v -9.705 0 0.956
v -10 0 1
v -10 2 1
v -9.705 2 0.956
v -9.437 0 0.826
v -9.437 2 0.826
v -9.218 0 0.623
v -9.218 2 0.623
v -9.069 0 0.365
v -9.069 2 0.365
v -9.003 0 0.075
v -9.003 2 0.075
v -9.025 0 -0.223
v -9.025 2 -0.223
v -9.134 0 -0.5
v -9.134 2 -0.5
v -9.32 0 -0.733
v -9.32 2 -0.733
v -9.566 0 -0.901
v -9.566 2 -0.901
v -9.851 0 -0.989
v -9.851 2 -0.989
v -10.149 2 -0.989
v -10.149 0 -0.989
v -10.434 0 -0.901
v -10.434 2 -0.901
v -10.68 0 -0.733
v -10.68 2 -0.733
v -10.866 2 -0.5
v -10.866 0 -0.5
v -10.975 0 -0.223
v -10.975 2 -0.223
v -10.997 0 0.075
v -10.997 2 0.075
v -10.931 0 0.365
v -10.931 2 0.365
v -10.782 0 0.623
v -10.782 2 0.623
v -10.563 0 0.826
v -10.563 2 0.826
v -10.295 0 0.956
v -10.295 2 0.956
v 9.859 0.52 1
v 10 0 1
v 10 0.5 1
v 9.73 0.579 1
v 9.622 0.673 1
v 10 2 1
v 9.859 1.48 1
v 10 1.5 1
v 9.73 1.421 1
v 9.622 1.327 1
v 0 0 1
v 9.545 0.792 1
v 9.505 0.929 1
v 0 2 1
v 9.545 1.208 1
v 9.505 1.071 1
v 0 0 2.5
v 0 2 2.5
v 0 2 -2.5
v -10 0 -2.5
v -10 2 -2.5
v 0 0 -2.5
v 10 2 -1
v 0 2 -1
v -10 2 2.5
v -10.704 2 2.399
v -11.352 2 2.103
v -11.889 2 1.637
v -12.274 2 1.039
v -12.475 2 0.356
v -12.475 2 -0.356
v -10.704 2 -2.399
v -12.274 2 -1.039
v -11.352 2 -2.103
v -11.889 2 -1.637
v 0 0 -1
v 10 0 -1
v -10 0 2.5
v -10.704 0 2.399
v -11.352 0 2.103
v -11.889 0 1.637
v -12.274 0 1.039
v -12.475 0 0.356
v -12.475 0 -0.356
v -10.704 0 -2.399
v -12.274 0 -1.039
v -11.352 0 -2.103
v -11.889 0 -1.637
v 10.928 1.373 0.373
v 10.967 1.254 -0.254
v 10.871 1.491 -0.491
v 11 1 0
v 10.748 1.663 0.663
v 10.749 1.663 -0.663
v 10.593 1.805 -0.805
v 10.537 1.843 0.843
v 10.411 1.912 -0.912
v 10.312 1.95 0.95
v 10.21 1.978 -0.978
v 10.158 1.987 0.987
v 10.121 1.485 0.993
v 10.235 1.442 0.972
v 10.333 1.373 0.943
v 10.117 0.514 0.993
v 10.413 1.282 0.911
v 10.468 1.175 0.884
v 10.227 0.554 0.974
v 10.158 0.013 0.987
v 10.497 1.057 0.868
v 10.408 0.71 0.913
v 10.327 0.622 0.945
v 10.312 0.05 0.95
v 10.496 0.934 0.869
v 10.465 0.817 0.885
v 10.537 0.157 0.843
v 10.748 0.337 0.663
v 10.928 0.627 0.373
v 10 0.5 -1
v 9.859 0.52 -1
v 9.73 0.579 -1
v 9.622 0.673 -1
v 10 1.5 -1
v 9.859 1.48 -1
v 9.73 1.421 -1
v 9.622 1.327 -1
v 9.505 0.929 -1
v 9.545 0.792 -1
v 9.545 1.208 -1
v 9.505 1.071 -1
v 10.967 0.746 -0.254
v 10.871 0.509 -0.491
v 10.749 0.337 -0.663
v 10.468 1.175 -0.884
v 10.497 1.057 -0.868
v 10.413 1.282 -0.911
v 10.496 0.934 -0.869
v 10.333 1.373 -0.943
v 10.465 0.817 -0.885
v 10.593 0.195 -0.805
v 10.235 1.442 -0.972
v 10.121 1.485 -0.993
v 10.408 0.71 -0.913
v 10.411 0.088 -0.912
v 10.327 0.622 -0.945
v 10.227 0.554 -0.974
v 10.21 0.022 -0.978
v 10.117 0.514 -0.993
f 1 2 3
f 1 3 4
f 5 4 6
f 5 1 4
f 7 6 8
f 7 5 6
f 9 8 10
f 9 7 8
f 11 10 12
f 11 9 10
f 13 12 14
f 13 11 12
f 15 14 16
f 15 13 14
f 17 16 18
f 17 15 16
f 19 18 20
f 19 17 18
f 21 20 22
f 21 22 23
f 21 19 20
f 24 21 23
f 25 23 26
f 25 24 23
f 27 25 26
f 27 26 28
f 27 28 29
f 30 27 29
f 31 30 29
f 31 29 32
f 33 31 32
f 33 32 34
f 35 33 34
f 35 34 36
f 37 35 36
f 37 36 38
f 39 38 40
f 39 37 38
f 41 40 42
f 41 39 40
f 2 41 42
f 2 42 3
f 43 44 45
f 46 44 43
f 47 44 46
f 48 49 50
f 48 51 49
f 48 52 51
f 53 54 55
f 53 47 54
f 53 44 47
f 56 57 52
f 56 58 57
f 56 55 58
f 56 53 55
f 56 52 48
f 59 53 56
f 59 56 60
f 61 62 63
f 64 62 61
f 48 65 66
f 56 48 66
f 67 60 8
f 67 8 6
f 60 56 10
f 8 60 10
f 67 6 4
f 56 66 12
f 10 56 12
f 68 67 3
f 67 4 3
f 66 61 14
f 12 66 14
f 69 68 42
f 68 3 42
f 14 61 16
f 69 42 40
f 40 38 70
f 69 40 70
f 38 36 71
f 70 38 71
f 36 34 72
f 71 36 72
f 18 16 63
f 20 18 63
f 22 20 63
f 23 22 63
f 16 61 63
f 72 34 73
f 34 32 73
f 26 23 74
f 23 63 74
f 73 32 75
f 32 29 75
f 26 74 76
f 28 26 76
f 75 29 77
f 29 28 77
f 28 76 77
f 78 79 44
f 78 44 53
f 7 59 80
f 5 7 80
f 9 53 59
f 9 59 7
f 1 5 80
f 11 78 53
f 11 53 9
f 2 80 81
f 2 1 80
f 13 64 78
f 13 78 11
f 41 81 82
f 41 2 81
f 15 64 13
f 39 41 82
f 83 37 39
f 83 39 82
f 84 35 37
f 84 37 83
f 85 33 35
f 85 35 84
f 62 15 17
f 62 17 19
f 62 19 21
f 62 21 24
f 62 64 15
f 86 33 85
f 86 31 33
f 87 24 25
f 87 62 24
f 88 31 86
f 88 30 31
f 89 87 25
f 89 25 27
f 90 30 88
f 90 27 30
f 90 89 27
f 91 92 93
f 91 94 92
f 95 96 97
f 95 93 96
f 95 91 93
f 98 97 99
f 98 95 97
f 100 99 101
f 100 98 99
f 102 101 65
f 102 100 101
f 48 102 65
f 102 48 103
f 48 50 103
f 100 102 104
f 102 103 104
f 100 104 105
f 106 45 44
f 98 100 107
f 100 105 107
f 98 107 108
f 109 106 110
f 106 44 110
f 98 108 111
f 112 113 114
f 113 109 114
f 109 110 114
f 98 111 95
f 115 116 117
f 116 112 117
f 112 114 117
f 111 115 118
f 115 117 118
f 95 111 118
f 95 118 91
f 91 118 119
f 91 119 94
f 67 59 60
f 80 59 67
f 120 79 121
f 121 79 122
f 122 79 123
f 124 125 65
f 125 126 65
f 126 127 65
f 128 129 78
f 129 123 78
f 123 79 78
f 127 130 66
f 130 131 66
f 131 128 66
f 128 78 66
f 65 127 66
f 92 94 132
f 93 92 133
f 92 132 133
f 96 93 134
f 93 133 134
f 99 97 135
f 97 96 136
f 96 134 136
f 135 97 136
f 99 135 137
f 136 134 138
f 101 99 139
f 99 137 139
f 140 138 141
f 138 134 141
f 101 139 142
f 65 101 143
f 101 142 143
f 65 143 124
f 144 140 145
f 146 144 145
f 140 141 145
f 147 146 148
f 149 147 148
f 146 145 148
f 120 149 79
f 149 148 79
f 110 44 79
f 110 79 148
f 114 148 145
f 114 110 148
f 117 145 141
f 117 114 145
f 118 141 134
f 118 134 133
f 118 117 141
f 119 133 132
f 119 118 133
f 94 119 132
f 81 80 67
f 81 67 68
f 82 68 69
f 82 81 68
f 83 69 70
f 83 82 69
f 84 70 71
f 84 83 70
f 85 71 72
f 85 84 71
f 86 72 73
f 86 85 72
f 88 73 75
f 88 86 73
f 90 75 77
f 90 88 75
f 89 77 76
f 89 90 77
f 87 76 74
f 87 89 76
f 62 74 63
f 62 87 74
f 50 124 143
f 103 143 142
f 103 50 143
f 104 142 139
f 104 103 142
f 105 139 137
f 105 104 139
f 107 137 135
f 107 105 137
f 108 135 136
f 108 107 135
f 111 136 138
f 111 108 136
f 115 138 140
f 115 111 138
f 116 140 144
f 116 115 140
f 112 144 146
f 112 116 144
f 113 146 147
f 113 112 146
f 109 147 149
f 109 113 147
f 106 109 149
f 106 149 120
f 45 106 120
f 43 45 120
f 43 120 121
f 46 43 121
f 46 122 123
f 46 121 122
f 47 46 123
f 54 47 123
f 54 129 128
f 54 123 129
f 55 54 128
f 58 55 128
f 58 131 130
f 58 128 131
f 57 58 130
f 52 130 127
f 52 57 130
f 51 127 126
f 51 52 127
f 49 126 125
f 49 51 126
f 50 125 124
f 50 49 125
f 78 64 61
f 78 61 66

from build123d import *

# Parameters (mm, degrees)
SKETCH1_R               = 1
BOSS_EXTRUDE1_DEPTH     = 2
SKETCH4_W               = 2
SKETCH4_H               = 2
BOSS_EXTRUDE2_DEPTH     = 11
CUT_EXTRUDE1_DEPTH      = 13.903487901
CUT_EXTRUDE1_DEPTH_BACK = 13.903487901
CUT_EXTRUDE2_DEPTH      = 14.133925537
CUT_EXTRUDE2_DEPTH_BACK = 14.133925537
CUT_EXTRUDE3_DEPTH      = 14.133925537
CUT_EXTRUDE3_DEPTH_BACK = 14.133925537
SKETCH7_R               = 0.5


with BuildPart() as part:
    # Sketch1 → Boss-Extrude1 (new body)
    with BuildSketch(Plane(origin=(0, 0, 0), x_dir=(1, 0, 0), z_dir=(0, 1, 0))):
        with BuildLine():
            Line((-10, 2.5), (0, 2.5))
            Line((0, 2.5), (0, -2.5))
            Line((0, -2.5), (-10, -2.5))
            ThreePointArc((-10, -2.5), (-12.5, 0), (-10, 2.5))
        make_face()
        with Locations(Location((-10, 0, 0), (0, 0, 270))):
            Circle(SKETCH1_R, mode=Mode.SUBTRACT)
    extrude(amount=BOSS_EXTRUDE1_DEPTH)

    # Sketch4 → Boss-Extrude2 (add)
    with BuildSketch(Plane(origin=(0, 0, 0), x_dir=(0, 0, -1), z_dir=(1, 0, 0))):
        with Locations((0, 1)):
            Rectangle(SKETCH4_W, SKETCH4_H)
    extrude(amount=BOSS_EXTRUDE2_DEPTH)

    # Sketch5 → Cut-Extrude1 (cut, two sides: drawn at the far end of the back side and taken through both)
    with BuildSketch(Plane(origin=(0, 2, 0), x_dir=(1, 0, 0), z_dir=(0, 1, 0)).offset(-CUT_EXTRUDE1_DEPTH_BACK)):
        with BuildLine():
            Line((10, 1), (10, 1.5))
            Line((10, 1.5), (12, 1.5))
            Line((12, 1.5), (12, -1.5))
            Line((12, -1.5), (10, -1.5))
            Line((10, -1.5), (10, -1))
            ThreePointArc((10, -1), (11, 0), (10, 1))
        make_face()
    extrude(amount=CUT_EXTRUDE1_DEPTH + CUT_EXTRUDE1_DEPTH_BACK, mode=Mode.SUBTRACT)

    # Sketch6 → Cut-Extrude2 (cut, two sides: drawn at the far end of the back side and taken through both)
    with BuildSketch(Plane(origin=(0, 0, -1), x_dir=(-1, 0, 0), z_dir=(0, 0, -1)).offset(-CUT_EXTRUDE2_DEPTH_BACK)):
        with BuildLine():
            Line((-10, 2), (-10, 2.5))
            Line((-10, 2.5), (-12, 2.5))
            Line((-12, 2.5), (-12, -0.5))
            Line((-12, -0.5), (-10, -0.5))
            Line((-10, -0.5), (-10, 0))
            ThreePointArc((-10, 0), (-11, 1), (-10, 2))
        make_face()
    extrude(amount=CUT_EXTRUDE2_DEPTH + CUT_EXTRUDE2_DEPTH_BACK, mode=Mode.SUBTRACT)

    # Sketch7 → Cut-Extrude3 (cut, two sides: drawn at the far end of the back side and taken through both)
    with BuildSketch(Plane(origin=(0, 0, -1), x_dir=(-1, 0, 0), z_dir=(0, 0, -1)).offset(-CUT_EXTRUDE3_DEPTH_BACK)):
        with Locations(Location((-10, 1, 0), (0, 0, 90))):
            Circle(SKETCH7_R)
    extrude(amount=CUT_EXTRUDE3_DEPTH + CUT_EXTRUDE3_DEPTH_BACK, mode=Mode.SUBTRACT)


solid = part.part
